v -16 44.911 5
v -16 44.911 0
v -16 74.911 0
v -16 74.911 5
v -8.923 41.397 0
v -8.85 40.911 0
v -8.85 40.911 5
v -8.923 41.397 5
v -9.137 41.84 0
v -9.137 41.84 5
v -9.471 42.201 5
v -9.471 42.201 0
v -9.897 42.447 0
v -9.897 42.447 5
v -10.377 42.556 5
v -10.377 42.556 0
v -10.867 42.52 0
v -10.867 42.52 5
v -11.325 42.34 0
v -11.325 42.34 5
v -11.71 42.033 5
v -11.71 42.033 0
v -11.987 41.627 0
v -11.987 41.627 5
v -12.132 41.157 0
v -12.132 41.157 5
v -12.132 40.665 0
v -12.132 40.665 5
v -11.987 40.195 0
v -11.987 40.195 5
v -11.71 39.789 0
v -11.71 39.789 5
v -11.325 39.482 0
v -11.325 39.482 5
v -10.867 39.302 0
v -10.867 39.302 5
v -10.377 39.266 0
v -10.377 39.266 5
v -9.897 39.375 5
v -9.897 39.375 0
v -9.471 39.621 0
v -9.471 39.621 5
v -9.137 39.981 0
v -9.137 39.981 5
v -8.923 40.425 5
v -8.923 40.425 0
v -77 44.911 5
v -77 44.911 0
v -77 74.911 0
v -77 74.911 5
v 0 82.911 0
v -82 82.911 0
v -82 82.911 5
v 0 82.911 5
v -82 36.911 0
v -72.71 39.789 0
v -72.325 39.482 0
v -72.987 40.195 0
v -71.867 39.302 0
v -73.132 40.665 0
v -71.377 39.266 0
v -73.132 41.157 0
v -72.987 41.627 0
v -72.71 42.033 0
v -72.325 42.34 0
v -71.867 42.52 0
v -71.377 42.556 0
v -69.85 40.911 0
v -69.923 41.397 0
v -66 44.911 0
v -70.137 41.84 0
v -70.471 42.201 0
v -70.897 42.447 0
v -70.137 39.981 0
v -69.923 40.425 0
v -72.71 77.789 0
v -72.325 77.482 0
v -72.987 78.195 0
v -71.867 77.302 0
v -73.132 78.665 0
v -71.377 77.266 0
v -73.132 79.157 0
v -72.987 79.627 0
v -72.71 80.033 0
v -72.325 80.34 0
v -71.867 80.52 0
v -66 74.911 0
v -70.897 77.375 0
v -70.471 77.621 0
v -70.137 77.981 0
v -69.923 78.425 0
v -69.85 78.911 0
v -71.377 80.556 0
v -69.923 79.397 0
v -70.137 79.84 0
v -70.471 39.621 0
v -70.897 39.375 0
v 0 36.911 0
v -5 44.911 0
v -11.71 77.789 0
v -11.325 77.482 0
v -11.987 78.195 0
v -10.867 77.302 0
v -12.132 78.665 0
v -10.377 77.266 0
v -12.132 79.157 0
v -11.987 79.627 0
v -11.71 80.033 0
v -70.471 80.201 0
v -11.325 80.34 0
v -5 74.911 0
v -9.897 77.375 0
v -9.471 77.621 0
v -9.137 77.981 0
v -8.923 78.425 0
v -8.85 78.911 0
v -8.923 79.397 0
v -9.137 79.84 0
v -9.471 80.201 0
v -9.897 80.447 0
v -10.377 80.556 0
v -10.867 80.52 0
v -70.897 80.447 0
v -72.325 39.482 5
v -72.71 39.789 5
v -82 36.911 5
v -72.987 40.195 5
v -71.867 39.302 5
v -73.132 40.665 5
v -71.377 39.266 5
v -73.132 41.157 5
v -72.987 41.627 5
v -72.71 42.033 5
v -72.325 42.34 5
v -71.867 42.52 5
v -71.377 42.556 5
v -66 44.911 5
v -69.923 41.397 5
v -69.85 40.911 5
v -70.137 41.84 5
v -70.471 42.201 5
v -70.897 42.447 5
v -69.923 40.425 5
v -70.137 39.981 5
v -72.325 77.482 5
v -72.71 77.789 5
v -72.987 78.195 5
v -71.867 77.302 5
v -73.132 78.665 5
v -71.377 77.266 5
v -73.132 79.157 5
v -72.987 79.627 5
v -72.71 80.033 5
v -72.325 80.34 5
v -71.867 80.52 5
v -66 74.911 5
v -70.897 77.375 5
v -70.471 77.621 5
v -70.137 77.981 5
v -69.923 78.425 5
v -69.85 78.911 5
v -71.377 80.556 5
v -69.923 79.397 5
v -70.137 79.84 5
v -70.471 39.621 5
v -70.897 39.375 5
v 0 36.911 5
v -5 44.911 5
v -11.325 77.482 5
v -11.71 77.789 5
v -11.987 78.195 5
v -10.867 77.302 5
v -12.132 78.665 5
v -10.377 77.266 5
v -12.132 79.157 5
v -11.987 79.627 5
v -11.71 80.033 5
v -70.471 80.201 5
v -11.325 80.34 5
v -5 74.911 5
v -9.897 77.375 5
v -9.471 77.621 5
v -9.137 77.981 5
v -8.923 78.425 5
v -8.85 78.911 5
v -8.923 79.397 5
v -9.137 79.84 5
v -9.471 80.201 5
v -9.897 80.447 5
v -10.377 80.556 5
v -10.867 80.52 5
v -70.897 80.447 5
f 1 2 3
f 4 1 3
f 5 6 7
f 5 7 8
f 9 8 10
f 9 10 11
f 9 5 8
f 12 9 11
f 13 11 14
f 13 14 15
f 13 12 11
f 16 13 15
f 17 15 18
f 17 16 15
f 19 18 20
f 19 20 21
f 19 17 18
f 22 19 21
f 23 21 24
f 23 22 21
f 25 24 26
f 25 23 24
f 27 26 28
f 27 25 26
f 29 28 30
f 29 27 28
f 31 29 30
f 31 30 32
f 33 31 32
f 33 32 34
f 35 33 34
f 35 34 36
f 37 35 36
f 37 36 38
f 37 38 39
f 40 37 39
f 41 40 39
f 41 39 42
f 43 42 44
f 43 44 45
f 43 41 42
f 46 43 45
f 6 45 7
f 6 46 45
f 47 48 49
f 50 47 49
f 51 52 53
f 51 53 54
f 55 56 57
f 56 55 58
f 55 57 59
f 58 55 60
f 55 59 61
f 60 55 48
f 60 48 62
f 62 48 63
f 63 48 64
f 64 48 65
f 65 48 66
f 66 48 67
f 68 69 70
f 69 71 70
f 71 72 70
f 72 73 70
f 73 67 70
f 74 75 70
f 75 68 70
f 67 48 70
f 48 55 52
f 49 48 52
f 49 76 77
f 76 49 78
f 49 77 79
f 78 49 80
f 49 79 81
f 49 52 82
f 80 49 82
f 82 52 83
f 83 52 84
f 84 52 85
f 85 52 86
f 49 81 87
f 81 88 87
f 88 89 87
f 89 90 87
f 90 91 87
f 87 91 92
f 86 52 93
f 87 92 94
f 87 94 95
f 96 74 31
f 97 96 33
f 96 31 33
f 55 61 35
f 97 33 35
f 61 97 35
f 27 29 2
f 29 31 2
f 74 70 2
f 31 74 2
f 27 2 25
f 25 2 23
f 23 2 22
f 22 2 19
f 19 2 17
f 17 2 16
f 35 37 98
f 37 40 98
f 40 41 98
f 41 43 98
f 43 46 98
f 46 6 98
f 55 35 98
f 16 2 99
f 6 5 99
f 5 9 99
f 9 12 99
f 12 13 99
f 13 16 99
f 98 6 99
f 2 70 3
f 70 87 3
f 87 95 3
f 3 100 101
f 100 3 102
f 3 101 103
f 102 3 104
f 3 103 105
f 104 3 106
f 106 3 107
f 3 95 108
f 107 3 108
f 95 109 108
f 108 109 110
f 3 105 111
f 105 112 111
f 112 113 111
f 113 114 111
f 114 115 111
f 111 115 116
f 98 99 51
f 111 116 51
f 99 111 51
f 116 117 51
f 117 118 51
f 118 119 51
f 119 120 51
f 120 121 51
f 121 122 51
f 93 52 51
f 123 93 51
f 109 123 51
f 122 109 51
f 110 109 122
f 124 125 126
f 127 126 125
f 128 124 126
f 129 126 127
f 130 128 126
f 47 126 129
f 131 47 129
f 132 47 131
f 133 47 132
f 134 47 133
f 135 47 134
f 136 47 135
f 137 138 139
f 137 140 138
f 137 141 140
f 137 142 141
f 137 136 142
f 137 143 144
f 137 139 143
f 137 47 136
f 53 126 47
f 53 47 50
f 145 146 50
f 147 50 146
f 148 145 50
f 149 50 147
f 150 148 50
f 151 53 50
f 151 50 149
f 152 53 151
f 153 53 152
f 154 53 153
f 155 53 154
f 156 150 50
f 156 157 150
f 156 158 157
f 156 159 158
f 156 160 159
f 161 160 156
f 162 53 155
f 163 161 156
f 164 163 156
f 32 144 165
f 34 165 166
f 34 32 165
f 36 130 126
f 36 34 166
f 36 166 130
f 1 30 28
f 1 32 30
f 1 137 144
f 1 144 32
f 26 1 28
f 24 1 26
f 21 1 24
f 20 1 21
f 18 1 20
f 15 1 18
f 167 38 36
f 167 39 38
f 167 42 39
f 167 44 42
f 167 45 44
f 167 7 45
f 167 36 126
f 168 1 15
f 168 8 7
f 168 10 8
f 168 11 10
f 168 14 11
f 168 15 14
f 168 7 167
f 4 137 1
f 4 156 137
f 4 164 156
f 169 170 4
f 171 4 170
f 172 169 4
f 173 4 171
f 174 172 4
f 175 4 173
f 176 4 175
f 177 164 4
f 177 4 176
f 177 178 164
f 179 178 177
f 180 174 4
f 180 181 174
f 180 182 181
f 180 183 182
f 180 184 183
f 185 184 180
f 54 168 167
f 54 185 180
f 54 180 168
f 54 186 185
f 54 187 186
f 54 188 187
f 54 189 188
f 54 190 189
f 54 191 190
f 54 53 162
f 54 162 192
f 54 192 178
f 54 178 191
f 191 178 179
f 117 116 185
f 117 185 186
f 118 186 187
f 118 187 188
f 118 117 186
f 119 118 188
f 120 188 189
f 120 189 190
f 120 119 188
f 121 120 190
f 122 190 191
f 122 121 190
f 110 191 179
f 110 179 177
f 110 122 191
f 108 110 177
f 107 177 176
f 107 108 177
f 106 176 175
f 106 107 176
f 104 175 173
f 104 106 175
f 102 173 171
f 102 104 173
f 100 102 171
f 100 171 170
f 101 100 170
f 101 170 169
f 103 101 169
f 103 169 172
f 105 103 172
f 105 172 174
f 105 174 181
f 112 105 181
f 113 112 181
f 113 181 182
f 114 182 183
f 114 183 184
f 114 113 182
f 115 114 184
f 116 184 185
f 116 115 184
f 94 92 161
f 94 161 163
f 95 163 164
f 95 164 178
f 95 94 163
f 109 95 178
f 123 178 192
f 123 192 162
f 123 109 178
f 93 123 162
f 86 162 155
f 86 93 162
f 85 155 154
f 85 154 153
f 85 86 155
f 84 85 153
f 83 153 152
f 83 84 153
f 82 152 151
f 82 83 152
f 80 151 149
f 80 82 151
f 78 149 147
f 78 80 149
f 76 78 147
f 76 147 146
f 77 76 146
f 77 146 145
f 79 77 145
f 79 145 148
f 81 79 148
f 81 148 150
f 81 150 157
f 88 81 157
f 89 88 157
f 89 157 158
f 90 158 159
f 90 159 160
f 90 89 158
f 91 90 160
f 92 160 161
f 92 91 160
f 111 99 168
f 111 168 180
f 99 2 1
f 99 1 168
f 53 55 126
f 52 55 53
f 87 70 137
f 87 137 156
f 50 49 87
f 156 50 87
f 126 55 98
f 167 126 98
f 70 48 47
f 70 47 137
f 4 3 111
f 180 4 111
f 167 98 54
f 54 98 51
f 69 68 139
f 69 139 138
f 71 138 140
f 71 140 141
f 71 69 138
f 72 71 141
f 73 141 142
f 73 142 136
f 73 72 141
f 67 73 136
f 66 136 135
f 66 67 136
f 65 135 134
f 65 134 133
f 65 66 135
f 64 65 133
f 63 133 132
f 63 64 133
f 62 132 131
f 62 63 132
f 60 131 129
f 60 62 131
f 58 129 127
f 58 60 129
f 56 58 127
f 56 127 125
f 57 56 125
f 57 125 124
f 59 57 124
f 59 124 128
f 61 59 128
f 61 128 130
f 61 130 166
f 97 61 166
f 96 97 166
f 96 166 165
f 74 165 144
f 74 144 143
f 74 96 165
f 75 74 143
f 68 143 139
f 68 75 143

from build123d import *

# Parameters (mm, degrees)
ESQUISSE1_W        = 82
ESQUISSE1_H        = 46
ESQUISSE1_R        = 1.65
ESQUISSE1_W_2      = 11
ESQUISSE1_H_2      = 30
BOSS_EXTRU_1_DEPTH = 5


with BuildPart() as part:
    # Esquisse1 → Boss.-Extru.1 (new body)
    with BuildSketch(Plane.XY):
        with Locations((-41, 59.910969495)):
            Rectangle(ESQUISSE1_W, ESQUISSE1_H)
        with Locations((-10.5, 40.910969495)):
            Circle(ESQUISSE1_R, mode=Mode.SUBTRACT)
        with Locations((-10.5, 78.910969495)):
            Circle(ESQUISSE1_R, mode=Mode.SUBTRACT)
        with Locations((-71.5, 40.910969495)):
            Circle(ESQUISSE1_R, mode=Mode.SUBTRACT)
        with Locations((-71.5, 78.910969495)):
            Circle(ESQUISSE1_R, mode=Mode.SUBTRACT)
        with Locations((-71.5, 59.910969495)):
            Rectangle(ESQUISSE1_W_2, ESQUISSE1_H_2, mode=Mode.SUBTRACT)
        with Locations((-10.5, 59.910969495)):
            Rectangle(ESQUISSE1_W_2, ESQUISSE1_H_2, mode=Mode.SUBTRACT)
    extrude(amount=BOSS_EXTRU_1_DEPTH)


solid = part.part
